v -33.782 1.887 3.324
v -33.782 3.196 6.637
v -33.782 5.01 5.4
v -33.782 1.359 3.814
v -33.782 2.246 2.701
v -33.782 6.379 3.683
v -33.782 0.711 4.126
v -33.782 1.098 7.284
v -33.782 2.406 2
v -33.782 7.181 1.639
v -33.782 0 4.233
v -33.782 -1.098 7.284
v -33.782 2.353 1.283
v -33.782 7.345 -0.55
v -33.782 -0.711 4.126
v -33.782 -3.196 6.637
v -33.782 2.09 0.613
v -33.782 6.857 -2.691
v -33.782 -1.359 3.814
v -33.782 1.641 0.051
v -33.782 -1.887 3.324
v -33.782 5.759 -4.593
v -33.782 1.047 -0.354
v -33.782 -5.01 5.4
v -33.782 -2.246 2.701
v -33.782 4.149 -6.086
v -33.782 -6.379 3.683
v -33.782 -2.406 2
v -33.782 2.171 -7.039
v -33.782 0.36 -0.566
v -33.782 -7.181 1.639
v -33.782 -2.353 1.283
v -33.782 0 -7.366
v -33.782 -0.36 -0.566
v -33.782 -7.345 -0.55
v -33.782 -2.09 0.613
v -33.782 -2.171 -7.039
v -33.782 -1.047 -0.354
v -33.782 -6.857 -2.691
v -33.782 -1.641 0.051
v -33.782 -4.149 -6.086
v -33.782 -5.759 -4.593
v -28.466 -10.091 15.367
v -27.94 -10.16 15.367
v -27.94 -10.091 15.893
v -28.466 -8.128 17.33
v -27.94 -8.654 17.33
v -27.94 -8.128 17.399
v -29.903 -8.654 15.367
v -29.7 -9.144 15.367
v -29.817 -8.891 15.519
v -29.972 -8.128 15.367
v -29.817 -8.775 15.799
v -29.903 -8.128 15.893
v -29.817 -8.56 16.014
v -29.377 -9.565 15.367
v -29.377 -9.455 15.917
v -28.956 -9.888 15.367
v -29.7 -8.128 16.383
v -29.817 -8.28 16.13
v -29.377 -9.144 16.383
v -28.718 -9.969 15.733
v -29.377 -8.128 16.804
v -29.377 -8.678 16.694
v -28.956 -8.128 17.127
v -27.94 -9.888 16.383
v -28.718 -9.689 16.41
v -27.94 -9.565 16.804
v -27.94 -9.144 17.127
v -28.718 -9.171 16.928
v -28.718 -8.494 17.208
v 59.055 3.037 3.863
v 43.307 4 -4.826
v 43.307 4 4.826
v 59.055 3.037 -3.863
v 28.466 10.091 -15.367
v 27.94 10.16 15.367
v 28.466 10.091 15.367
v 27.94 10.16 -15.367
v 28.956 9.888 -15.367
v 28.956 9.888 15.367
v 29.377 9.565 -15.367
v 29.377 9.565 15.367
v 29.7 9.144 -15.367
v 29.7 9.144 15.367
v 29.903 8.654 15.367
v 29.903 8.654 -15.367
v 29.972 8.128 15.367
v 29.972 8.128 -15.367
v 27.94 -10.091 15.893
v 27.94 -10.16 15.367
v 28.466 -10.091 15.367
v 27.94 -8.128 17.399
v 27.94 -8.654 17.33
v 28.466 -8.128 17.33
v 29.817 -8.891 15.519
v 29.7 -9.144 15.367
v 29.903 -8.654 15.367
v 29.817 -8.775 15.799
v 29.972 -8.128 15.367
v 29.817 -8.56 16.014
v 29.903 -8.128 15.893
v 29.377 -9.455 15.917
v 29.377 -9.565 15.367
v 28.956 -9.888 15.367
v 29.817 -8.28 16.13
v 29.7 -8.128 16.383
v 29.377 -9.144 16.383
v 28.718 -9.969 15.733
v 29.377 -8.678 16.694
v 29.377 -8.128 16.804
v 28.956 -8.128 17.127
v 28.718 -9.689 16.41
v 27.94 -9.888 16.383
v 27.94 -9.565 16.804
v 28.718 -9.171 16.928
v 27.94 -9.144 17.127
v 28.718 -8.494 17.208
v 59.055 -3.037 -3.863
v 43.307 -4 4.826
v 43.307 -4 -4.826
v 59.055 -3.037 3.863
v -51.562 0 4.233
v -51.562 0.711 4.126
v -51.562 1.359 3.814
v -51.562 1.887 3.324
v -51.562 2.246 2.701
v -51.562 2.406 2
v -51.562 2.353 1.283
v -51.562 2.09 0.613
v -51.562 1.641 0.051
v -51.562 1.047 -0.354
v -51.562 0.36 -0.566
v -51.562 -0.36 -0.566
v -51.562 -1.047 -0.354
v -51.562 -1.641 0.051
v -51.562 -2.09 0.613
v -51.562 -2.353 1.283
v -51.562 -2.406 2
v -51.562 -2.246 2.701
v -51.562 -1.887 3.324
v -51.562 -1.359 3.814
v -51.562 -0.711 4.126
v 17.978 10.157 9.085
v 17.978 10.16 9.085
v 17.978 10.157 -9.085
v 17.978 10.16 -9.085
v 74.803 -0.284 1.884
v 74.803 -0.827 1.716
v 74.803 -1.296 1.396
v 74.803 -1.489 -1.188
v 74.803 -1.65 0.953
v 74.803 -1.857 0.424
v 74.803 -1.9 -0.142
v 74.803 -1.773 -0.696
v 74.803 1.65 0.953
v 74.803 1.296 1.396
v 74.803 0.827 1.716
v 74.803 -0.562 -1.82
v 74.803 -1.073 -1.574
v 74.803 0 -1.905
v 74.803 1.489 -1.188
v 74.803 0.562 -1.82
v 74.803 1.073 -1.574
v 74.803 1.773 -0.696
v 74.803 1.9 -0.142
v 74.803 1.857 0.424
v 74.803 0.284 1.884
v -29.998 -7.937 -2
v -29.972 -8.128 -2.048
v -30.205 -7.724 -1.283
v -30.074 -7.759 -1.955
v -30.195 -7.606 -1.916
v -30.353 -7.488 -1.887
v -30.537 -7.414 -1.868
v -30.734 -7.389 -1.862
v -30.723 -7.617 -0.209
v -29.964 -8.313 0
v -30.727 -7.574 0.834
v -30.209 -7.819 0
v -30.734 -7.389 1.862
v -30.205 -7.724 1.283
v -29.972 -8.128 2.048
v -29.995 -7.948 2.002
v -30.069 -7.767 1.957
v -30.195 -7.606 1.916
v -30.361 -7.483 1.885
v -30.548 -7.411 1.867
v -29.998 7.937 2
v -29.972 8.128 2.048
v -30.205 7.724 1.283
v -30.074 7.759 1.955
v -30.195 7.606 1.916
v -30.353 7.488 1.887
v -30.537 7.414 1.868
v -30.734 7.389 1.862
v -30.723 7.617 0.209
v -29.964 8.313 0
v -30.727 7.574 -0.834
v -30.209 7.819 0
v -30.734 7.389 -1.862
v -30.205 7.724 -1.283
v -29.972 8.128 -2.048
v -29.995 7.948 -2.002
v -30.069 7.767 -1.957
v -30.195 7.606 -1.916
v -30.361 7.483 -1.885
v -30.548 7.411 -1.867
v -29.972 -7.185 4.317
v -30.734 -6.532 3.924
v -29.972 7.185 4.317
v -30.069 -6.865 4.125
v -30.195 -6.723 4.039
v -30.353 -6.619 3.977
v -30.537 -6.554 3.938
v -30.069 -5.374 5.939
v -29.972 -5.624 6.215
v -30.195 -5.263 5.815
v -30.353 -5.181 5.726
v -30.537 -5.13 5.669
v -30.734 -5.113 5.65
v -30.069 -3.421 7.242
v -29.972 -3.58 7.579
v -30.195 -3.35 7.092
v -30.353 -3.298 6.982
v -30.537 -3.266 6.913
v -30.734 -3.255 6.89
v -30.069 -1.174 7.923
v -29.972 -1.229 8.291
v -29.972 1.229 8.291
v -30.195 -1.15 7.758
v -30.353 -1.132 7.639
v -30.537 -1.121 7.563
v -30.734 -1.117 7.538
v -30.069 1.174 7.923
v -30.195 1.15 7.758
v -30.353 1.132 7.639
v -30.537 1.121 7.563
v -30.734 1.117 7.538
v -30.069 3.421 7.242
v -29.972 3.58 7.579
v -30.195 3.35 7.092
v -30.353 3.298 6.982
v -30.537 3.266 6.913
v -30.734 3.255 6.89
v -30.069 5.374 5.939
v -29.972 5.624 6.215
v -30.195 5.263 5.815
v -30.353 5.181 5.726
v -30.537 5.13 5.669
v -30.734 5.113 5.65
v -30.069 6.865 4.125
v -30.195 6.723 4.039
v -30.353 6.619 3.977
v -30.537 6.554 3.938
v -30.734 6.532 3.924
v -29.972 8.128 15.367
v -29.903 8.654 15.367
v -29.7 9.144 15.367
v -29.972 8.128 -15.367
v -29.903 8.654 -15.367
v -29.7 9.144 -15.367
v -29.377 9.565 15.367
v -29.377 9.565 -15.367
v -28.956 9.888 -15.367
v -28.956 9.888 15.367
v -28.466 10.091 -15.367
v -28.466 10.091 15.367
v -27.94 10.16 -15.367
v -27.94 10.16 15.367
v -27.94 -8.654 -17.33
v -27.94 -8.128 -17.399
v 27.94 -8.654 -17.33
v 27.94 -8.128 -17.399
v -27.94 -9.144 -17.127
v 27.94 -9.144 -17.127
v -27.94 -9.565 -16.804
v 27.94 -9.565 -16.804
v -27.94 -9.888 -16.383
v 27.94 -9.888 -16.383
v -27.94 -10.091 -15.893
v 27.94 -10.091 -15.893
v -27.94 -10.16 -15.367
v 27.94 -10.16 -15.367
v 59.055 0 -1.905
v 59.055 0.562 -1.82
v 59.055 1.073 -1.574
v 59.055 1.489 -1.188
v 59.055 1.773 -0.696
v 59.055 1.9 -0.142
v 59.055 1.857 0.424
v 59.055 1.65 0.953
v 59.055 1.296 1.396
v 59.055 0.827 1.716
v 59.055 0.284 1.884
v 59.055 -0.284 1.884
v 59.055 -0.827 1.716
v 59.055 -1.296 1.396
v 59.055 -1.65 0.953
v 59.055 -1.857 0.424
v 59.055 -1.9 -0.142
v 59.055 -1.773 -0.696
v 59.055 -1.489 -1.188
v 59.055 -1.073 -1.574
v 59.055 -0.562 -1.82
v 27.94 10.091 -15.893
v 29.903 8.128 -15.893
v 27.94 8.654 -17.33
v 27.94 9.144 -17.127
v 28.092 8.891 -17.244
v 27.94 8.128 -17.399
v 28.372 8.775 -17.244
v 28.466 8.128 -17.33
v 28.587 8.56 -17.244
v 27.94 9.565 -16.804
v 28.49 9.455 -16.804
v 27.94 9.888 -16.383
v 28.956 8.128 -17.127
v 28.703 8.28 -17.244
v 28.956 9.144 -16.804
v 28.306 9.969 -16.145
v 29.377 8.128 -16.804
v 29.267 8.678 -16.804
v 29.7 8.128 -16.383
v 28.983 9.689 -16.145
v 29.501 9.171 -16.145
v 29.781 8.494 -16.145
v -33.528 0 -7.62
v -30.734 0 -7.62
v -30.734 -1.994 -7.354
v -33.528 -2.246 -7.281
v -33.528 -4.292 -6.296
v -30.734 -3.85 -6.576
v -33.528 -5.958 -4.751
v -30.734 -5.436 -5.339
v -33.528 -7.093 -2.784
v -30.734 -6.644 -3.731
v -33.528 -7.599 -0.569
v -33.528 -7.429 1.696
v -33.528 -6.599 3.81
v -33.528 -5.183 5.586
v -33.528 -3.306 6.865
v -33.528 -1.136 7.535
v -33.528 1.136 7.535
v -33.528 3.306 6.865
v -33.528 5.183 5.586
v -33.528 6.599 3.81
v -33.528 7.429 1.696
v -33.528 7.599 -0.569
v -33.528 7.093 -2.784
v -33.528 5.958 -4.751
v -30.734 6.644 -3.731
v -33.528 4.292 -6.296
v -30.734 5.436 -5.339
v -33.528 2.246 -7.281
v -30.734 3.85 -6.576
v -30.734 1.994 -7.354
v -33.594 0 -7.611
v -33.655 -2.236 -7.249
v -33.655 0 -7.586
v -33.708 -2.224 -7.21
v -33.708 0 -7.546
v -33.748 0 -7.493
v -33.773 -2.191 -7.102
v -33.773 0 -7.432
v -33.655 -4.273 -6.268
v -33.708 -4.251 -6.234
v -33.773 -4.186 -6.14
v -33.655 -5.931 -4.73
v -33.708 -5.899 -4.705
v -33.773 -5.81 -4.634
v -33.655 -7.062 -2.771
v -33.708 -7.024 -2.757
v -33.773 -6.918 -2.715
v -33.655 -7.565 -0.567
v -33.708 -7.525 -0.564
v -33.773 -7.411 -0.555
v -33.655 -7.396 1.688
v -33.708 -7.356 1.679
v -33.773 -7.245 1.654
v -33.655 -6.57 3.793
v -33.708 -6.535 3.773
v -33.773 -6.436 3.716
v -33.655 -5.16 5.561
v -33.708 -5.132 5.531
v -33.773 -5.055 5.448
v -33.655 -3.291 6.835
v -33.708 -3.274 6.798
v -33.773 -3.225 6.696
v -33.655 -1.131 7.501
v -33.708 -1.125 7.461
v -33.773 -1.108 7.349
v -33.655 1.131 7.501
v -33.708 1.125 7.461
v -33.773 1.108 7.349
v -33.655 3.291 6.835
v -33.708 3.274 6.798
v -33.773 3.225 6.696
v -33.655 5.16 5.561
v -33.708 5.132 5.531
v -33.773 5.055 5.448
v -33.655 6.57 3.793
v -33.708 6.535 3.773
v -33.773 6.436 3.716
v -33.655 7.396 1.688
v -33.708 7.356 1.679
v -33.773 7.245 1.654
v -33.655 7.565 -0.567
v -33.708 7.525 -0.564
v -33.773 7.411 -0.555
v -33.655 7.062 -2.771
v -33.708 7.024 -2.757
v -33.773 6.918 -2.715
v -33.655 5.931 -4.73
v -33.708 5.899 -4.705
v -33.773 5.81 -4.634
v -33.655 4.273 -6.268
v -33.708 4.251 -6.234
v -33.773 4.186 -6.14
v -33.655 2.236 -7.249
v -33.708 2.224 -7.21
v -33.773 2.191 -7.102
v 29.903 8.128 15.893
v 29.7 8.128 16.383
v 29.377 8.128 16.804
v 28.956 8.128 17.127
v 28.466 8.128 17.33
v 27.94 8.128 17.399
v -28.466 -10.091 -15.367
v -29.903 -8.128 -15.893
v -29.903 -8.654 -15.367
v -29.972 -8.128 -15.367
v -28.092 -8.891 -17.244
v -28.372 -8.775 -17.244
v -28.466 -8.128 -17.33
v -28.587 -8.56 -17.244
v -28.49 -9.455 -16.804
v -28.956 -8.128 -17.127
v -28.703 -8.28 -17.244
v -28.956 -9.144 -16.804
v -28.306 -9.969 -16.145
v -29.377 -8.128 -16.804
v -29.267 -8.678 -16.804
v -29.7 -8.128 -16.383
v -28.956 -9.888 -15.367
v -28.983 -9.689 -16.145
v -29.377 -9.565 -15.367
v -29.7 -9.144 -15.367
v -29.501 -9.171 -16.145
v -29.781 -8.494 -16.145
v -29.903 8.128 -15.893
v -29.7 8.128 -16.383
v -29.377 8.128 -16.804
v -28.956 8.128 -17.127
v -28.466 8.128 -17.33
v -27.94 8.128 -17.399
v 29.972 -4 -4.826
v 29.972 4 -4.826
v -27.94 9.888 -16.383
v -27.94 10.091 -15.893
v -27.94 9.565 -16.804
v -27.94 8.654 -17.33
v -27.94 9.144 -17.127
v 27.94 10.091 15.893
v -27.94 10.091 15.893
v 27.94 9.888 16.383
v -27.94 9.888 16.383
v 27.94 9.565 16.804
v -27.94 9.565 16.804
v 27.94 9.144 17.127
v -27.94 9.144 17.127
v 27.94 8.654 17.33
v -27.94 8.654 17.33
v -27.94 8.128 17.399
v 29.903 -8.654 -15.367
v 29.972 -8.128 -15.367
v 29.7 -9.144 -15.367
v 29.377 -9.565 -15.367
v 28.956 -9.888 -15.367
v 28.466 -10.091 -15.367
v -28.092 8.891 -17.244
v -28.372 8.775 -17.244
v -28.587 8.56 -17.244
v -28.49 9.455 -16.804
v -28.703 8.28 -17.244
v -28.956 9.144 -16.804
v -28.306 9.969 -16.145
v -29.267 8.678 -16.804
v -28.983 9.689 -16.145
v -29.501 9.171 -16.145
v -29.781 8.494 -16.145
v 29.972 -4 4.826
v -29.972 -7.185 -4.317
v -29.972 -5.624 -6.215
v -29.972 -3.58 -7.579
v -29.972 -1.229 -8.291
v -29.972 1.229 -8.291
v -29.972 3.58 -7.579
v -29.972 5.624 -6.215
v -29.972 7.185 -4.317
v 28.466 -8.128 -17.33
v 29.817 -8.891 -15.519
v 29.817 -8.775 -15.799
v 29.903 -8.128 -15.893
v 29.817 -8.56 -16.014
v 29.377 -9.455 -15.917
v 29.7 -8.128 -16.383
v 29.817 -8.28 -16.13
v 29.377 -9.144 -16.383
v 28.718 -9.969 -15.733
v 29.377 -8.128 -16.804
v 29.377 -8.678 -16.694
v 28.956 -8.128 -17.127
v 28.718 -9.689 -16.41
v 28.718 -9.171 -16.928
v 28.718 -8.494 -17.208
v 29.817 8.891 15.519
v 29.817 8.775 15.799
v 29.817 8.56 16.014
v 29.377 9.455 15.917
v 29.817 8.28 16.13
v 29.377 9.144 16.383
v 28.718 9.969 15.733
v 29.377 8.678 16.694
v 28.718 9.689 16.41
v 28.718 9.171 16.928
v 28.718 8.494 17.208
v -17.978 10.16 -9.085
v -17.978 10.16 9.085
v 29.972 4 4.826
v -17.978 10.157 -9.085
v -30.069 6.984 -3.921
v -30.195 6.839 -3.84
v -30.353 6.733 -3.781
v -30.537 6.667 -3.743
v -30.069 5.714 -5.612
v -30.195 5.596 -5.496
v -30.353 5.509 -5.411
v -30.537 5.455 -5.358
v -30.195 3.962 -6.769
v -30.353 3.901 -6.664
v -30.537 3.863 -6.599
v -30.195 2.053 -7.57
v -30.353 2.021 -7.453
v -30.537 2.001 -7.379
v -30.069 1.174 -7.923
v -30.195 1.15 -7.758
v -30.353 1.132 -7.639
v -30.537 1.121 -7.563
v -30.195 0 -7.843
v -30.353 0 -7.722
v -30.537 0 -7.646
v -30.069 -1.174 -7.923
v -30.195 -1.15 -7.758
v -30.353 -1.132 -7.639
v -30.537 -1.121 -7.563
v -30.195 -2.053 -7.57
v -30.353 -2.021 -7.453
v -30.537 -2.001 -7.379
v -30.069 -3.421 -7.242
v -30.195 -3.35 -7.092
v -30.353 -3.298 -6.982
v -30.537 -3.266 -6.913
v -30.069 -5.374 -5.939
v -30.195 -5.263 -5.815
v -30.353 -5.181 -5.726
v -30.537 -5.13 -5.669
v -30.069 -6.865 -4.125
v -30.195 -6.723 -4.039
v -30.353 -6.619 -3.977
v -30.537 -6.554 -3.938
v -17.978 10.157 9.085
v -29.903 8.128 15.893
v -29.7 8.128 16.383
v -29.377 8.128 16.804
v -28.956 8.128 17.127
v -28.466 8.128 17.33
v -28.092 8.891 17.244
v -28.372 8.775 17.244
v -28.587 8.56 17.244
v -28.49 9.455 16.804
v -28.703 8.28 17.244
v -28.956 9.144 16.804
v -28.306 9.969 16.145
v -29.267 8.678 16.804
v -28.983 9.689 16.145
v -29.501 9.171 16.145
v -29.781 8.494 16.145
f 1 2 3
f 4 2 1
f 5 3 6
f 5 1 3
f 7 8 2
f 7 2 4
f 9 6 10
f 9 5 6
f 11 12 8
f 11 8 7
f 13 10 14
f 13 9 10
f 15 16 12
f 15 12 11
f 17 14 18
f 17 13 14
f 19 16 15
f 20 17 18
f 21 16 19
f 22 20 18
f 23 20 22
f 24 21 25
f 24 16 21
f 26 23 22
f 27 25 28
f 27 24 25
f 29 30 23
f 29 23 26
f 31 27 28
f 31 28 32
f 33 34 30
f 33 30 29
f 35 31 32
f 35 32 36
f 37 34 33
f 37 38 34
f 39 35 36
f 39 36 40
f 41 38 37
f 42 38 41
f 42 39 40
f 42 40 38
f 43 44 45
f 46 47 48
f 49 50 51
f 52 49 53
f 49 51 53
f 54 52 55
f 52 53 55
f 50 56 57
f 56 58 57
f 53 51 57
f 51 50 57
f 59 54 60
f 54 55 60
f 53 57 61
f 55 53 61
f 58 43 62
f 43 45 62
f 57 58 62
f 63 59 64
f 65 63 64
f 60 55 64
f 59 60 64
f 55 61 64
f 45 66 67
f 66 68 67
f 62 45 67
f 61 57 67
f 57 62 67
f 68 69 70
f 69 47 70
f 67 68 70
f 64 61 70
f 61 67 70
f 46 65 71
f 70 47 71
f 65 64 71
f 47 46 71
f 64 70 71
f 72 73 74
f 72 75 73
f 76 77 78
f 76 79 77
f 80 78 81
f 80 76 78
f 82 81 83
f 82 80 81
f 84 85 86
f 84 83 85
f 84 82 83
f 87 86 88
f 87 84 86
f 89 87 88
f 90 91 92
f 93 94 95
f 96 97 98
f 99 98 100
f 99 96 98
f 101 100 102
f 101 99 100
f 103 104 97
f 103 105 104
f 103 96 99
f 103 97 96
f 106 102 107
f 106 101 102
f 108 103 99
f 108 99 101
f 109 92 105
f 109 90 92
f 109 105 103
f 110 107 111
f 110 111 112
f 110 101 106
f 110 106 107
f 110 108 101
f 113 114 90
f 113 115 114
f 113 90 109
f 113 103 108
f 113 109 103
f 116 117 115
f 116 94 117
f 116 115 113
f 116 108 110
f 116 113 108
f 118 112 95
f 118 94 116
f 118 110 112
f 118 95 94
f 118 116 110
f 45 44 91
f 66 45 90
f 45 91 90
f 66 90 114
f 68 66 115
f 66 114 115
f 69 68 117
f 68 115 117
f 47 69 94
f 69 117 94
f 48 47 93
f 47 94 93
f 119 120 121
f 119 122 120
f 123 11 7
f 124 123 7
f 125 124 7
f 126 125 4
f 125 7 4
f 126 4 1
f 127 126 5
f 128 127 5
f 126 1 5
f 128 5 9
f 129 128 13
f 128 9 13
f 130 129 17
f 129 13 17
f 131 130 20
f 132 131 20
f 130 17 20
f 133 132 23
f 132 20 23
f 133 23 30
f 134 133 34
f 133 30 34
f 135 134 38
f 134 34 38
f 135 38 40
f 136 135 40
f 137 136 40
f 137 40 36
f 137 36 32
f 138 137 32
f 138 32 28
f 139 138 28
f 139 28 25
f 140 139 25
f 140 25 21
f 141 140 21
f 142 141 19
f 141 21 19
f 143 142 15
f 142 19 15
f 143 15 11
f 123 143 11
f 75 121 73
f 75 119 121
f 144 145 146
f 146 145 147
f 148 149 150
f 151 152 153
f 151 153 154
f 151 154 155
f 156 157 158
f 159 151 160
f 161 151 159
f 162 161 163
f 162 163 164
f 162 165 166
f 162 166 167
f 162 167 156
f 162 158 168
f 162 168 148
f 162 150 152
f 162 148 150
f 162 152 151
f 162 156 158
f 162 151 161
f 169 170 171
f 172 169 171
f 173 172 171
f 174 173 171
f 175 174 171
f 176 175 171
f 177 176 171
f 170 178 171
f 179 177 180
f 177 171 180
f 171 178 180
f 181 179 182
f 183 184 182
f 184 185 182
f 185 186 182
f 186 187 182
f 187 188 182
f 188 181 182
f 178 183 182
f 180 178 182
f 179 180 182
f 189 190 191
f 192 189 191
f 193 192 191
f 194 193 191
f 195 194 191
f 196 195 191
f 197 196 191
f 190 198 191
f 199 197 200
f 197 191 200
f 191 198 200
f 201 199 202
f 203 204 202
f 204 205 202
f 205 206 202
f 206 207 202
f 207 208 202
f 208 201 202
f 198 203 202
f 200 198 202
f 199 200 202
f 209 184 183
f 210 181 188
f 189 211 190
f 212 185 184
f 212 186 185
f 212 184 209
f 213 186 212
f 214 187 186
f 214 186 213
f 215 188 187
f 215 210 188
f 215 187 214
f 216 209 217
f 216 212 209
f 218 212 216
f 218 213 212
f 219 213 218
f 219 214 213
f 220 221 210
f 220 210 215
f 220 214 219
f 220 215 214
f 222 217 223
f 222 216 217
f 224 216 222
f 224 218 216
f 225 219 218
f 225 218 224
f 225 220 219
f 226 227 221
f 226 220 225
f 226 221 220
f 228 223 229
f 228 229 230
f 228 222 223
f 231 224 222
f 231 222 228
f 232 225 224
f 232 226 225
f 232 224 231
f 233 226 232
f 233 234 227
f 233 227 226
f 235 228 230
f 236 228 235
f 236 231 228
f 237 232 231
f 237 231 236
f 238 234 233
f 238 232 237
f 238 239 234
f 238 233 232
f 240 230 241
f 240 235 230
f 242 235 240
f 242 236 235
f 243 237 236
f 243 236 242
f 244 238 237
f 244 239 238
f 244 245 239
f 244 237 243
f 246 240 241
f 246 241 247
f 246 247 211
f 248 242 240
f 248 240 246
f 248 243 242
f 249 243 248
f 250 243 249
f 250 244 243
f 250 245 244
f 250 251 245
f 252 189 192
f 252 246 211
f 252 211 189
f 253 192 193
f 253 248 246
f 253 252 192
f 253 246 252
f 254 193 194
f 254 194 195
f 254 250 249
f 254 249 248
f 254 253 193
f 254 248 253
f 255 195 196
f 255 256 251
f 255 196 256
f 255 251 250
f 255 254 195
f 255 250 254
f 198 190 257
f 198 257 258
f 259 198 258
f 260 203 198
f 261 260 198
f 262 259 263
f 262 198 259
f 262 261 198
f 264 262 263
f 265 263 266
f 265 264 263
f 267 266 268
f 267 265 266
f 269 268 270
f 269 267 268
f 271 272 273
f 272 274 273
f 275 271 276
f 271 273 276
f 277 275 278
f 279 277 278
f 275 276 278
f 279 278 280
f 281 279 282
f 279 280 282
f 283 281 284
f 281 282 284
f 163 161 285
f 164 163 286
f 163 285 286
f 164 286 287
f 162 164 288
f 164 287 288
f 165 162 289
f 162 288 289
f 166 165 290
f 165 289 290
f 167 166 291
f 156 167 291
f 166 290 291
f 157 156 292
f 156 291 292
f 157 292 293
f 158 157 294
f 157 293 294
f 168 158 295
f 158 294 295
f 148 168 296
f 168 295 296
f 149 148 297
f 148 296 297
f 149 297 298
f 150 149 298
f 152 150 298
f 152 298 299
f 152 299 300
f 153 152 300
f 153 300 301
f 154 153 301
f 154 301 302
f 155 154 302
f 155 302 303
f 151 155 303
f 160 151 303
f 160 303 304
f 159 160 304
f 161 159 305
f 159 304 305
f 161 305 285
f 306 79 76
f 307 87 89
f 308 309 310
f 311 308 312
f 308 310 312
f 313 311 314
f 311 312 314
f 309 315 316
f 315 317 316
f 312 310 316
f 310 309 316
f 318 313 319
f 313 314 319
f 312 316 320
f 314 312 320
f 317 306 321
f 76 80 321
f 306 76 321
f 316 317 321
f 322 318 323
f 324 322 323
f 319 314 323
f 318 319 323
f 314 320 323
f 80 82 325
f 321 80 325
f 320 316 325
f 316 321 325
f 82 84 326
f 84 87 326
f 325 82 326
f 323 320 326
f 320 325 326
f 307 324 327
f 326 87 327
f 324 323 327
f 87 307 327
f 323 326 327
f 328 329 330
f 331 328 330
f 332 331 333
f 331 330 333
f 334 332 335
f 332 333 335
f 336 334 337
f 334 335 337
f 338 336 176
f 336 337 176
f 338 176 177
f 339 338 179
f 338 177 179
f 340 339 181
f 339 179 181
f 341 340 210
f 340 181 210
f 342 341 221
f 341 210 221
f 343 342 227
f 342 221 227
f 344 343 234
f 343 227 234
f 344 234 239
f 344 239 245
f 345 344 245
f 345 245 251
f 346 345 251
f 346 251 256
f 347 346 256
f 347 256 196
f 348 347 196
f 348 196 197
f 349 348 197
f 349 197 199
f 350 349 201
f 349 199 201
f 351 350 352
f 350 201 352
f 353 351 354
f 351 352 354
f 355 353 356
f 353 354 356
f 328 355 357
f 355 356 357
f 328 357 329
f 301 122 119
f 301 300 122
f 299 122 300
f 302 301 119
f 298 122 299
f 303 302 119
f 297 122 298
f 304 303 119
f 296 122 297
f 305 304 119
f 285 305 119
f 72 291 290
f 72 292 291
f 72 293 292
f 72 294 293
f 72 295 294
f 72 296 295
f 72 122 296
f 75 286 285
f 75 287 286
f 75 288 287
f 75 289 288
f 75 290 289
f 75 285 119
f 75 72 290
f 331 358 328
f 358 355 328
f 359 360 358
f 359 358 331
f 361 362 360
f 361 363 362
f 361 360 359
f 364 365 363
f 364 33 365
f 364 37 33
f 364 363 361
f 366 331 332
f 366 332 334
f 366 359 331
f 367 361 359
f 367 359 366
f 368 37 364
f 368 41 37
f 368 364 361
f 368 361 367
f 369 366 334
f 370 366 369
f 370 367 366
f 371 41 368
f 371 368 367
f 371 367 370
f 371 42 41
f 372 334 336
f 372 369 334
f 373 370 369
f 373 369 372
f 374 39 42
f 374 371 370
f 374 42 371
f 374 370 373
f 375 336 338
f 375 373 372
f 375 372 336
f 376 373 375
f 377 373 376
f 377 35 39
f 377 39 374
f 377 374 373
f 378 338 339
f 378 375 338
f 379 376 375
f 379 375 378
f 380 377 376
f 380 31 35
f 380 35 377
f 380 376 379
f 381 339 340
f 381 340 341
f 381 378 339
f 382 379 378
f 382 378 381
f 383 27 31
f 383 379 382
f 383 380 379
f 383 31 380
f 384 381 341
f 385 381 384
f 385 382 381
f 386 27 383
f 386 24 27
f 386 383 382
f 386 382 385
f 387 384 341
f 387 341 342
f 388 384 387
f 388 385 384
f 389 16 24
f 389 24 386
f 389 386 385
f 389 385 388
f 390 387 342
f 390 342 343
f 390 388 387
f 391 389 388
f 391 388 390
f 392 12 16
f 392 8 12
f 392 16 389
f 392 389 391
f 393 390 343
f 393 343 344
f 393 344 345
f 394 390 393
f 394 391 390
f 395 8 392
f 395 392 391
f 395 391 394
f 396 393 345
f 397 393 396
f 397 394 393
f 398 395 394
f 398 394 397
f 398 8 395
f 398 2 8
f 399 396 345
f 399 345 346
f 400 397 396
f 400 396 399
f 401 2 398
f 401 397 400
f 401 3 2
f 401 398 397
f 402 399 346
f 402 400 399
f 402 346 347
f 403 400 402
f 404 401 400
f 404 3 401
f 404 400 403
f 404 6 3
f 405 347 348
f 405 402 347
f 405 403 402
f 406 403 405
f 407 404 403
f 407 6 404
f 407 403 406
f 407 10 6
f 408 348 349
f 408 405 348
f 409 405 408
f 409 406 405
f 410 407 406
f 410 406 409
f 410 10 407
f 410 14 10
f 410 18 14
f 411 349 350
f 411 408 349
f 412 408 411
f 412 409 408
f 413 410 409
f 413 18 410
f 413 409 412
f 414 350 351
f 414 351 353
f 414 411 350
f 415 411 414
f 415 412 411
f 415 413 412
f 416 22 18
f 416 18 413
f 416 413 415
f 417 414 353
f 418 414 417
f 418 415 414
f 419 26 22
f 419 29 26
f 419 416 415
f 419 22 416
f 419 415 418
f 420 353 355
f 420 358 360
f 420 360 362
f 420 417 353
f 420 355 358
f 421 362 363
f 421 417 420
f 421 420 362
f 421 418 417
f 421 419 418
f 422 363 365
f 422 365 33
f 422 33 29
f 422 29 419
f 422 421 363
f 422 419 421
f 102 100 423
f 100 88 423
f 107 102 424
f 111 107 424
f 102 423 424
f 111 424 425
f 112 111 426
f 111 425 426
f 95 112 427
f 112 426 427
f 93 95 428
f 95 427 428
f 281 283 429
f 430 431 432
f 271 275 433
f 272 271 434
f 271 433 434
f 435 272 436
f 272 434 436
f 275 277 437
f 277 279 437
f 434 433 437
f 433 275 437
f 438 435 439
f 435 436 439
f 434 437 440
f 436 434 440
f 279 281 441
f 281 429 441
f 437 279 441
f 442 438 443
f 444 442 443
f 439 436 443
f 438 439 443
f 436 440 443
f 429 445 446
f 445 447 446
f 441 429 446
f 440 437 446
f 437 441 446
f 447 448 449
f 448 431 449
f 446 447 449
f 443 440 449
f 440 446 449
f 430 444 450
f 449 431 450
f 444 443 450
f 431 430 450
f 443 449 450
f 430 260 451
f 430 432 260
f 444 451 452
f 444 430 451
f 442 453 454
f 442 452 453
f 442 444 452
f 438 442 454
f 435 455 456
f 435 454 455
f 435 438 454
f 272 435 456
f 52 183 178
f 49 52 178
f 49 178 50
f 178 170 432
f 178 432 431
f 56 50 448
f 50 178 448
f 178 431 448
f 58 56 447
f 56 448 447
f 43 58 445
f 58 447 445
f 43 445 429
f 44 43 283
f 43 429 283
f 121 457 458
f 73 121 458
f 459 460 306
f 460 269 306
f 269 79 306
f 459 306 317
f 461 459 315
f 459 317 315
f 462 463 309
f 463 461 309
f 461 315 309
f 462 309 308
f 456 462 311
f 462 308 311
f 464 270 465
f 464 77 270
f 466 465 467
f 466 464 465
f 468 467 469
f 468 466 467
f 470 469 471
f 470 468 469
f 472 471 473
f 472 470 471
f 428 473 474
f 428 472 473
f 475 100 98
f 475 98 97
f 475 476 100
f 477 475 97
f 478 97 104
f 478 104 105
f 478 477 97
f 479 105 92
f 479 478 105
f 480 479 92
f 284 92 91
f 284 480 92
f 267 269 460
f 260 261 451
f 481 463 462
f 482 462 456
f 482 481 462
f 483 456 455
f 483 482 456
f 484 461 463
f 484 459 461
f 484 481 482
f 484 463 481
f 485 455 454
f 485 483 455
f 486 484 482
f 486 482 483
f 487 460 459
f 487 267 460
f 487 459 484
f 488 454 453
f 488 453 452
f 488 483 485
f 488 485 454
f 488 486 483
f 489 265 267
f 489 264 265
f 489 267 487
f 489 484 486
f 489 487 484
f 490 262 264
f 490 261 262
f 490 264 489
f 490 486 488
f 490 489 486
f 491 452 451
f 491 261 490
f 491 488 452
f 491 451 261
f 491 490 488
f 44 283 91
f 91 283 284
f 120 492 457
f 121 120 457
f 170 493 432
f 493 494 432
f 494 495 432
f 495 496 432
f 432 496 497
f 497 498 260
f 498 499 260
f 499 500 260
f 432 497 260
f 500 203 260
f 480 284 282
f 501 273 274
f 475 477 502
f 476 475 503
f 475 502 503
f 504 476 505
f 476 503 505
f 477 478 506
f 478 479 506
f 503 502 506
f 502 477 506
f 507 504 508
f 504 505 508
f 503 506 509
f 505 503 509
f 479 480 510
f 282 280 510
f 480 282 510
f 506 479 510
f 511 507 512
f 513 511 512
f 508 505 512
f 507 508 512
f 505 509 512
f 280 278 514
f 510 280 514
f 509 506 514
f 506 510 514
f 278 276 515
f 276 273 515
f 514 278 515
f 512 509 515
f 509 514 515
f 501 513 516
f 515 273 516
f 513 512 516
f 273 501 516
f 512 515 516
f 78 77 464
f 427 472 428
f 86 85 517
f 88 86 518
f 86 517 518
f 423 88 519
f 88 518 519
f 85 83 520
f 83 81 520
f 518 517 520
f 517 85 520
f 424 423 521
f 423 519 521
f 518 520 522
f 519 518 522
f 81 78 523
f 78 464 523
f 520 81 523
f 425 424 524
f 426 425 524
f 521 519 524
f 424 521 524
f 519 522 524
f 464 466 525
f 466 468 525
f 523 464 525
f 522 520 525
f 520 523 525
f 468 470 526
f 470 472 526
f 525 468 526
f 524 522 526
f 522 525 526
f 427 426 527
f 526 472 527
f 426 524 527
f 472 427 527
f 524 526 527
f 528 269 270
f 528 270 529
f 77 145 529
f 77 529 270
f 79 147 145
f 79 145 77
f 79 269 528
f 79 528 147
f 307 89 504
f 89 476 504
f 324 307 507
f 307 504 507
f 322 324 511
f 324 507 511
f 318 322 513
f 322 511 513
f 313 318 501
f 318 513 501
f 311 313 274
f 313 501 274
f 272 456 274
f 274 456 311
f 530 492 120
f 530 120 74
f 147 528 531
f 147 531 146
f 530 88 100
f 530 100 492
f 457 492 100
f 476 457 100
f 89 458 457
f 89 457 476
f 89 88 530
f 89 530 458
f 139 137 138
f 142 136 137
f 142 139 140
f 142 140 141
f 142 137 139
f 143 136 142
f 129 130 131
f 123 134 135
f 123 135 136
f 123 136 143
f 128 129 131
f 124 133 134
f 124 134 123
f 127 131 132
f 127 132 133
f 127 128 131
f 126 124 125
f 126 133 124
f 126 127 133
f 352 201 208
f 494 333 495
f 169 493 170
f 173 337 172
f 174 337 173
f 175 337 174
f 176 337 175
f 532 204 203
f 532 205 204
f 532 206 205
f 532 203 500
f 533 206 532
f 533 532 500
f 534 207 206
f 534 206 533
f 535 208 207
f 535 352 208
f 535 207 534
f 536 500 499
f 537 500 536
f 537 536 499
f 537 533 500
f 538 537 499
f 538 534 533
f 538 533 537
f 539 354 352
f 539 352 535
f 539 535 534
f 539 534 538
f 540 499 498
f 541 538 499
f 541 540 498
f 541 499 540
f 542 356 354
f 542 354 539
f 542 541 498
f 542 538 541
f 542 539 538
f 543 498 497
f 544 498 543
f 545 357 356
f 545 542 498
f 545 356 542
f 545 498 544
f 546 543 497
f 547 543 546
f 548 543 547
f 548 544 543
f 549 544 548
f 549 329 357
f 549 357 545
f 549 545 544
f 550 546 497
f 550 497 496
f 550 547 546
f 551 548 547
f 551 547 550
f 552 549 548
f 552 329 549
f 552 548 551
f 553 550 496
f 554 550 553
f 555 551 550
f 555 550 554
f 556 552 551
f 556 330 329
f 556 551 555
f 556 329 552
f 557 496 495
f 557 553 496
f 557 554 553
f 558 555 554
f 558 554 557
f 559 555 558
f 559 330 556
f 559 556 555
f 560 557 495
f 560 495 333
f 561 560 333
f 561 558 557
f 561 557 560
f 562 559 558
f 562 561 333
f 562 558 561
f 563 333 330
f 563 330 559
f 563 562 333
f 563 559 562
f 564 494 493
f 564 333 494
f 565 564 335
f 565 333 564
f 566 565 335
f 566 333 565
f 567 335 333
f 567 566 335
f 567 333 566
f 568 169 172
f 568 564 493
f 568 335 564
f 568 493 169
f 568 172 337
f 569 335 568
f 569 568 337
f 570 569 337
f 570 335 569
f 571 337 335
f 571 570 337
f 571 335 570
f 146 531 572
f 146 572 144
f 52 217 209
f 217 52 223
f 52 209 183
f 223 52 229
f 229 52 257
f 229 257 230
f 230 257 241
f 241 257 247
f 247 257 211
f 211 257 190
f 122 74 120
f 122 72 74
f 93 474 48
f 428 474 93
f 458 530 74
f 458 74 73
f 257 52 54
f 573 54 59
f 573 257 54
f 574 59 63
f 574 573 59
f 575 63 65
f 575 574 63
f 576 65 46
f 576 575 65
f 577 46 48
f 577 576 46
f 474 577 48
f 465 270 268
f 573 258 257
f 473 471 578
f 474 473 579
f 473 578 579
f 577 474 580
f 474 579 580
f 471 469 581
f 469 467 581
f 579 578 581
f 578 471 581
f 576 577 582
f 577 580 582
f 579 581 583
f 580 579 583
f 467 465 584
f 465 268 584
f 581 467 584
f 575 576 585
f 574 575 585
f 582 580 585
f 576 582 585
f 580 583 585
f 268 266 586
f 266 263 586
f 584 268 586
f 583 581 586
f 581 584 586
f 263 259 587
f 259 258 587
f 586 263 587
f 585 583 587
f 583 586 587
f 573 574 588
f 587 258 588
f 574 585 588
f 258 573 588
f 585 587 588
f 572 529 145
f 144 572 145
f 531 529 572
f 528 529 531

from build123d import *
from OCP.BRepFilletAPI import BRepFilletAPI_MakeFillet

# Parameters (mm, degrees)
SKETCH1_W           = 59.944
SKETCH1_H           = 34.798
BOSS_EXTRUDE1_DEPTH = 10.16
FILLET1_R           = 2.032
SKETCH2_R           = 7.62
BOSS_EXTRUDE2_DEPTH = 3.81
FILLET2_R1          = 0.254
FILLET2_R2          = 0.762
SKETCH3_R           = 2.413
BOSS_EXTRUDE3_DEPTH = 17.78
SKETCH4_W           = 9.652
SKETCH4_H           = 8.001
BOSS_EXTRUDE4_DEPTH = 13.335
SKETCH5_W           = 9.652
SKETCH5_H           = 8.001
BOSS_EXTRUDE5_DEPTH = 15.748
BOSS_EXTRUDE5_TAPER = 3.5
SKETCH6_R           = 1.905
BOSS_EXTRUDE6_DEPTH = 15.748
SKETCH7_W           = 35.955959778
SKETCH7_H           = 18.169743528
CUT_EXTRUDE1_DEPTH  = 0.00254


with BuildPart() as part:
    # Sketch1 → Boss-Extrude1 (new, symmetric)
    with BuildSketch(Plane(origin=(0, 0, 0), x_dir=(1, 0, 0), z_dir=(0, 1, 0))):
        Rectangle(SKETCH1_W, SKETCH1_H)
    extrude(amount=BOSS_EXTRUDE1_DEPTH, both=True)

    # Fillet1
    fillet1_edges = [part.edges().sort_by_distance(p)[0] for p in [
        (-29.972, 0, -17.399),
        (0, -10.16, -17.399),
        (-29.972, -10.16, 0),
        (29.972, 0, -17.399),
        (29.972, -10.16, 0),
        (-29.972, 0, 17.399),
        (29.972, 0, 17.399),
        (0, -10.16, 17.399),
        (0, 10.16, 17.399),
        (-29.972, 10.16, 0),
        (0, 10.16, -17.399),
        (29.972, 10.16, 0),
    ]]
    fillet(fillet1_edges, radius=FILLET1_R)

    # Sketch2 → Boss-Extrude2 (add)
    with BuildSketch(Plane.ZY.offset(29.972)):
        Circle(SKETCH2_R)
    extrude(amount=BOSS_EXTRUDE2_DEPTH)

    # Fillet2: one fillet with a radius per group of edges: ONE call of the kernel's fillet builder (fillet() takes one radius for all edges)
    fillet2_edges_1 = [part.edges().sort_by_distance(p)[0] for p in [
        (-33.782, 0, -7.62),
    ]]
    fillet2_edges_2 = [part.edges().sort_by_distance(p)[0] for p in [
        (-29.972, 0, -7.62),
    ]]
    fillet2 = BRepFilletAPI_MakeFillet(part.part.solid().wrapped)
    for e in fillet2_edges_1:
        fillet2.Add(FILLET2_R1, e.wrapped)
    for e in fillet2_edges_2:
        fillet2.Add(FILLET2_R2, e.wrapped)
    add(Compound.cast(fillet2.Shape()), mode=Mode.REPLACE)

    # Sketch3 → Boss-Extrude3 (add)
    with BuildSketch(Plane.ZY.offset(33.782)):
        with Locations((1.819787166, 0)):
            Circle(SKETCH3_R)
    extrude(amount=BOSS_EXTRUDE3_DEPTH)

    # Sketch4 → Boss-Extrude4 (add)
    with BuildSketch(Plane(origin=(29.972, 0, 0), x_dir=(0, 0, -1), z_dir=(1, 0, 0))):
        Rectangle(SKETCH4_W, SKETCH4_H)
    extrude(amount=BOSS_EXTRUDE4_DEPTH)

    # Sketch5 → Boss-Extrude5 (add)
    with BuildSketch(Plane(origin=(43.307, 0, 0), x_dir=(0, 0, -1), z_dir=(1, 0, 0))):
        Rectangle(SKETCH5_W, SKETCH5_H)
    extrude(amount=BOSS_EXTRUDE5_DEPTH, taper=BOSS_EXTRUDE5_TAPER)

    # Sketch6 → Boss-Extrude6 (add)
    with BuildSketch(Plane(origin=(59.055, 0, 0), x_dir=(0, 0, -1), z_dir=(1, 0, 0))):
        Circle(SKETCH6_R)
    extrude(amount=BOSS_EXTRUDE6_DEPTH)

    # Sketch7 → Cut-Extrude1 (cut)
    with BuildSketch(Plane(origin=(0, 10.16, 0), x_dir=(1, 0, 0), z_dir=(0, 1, 0))):
        Rectangle(SKETCH7_W, SKETCH7_H)
    extrude(amount=-CUT_EXTRUDE1_DEPTH, mode=Mode.SUBTRACT)


solid = part.part
